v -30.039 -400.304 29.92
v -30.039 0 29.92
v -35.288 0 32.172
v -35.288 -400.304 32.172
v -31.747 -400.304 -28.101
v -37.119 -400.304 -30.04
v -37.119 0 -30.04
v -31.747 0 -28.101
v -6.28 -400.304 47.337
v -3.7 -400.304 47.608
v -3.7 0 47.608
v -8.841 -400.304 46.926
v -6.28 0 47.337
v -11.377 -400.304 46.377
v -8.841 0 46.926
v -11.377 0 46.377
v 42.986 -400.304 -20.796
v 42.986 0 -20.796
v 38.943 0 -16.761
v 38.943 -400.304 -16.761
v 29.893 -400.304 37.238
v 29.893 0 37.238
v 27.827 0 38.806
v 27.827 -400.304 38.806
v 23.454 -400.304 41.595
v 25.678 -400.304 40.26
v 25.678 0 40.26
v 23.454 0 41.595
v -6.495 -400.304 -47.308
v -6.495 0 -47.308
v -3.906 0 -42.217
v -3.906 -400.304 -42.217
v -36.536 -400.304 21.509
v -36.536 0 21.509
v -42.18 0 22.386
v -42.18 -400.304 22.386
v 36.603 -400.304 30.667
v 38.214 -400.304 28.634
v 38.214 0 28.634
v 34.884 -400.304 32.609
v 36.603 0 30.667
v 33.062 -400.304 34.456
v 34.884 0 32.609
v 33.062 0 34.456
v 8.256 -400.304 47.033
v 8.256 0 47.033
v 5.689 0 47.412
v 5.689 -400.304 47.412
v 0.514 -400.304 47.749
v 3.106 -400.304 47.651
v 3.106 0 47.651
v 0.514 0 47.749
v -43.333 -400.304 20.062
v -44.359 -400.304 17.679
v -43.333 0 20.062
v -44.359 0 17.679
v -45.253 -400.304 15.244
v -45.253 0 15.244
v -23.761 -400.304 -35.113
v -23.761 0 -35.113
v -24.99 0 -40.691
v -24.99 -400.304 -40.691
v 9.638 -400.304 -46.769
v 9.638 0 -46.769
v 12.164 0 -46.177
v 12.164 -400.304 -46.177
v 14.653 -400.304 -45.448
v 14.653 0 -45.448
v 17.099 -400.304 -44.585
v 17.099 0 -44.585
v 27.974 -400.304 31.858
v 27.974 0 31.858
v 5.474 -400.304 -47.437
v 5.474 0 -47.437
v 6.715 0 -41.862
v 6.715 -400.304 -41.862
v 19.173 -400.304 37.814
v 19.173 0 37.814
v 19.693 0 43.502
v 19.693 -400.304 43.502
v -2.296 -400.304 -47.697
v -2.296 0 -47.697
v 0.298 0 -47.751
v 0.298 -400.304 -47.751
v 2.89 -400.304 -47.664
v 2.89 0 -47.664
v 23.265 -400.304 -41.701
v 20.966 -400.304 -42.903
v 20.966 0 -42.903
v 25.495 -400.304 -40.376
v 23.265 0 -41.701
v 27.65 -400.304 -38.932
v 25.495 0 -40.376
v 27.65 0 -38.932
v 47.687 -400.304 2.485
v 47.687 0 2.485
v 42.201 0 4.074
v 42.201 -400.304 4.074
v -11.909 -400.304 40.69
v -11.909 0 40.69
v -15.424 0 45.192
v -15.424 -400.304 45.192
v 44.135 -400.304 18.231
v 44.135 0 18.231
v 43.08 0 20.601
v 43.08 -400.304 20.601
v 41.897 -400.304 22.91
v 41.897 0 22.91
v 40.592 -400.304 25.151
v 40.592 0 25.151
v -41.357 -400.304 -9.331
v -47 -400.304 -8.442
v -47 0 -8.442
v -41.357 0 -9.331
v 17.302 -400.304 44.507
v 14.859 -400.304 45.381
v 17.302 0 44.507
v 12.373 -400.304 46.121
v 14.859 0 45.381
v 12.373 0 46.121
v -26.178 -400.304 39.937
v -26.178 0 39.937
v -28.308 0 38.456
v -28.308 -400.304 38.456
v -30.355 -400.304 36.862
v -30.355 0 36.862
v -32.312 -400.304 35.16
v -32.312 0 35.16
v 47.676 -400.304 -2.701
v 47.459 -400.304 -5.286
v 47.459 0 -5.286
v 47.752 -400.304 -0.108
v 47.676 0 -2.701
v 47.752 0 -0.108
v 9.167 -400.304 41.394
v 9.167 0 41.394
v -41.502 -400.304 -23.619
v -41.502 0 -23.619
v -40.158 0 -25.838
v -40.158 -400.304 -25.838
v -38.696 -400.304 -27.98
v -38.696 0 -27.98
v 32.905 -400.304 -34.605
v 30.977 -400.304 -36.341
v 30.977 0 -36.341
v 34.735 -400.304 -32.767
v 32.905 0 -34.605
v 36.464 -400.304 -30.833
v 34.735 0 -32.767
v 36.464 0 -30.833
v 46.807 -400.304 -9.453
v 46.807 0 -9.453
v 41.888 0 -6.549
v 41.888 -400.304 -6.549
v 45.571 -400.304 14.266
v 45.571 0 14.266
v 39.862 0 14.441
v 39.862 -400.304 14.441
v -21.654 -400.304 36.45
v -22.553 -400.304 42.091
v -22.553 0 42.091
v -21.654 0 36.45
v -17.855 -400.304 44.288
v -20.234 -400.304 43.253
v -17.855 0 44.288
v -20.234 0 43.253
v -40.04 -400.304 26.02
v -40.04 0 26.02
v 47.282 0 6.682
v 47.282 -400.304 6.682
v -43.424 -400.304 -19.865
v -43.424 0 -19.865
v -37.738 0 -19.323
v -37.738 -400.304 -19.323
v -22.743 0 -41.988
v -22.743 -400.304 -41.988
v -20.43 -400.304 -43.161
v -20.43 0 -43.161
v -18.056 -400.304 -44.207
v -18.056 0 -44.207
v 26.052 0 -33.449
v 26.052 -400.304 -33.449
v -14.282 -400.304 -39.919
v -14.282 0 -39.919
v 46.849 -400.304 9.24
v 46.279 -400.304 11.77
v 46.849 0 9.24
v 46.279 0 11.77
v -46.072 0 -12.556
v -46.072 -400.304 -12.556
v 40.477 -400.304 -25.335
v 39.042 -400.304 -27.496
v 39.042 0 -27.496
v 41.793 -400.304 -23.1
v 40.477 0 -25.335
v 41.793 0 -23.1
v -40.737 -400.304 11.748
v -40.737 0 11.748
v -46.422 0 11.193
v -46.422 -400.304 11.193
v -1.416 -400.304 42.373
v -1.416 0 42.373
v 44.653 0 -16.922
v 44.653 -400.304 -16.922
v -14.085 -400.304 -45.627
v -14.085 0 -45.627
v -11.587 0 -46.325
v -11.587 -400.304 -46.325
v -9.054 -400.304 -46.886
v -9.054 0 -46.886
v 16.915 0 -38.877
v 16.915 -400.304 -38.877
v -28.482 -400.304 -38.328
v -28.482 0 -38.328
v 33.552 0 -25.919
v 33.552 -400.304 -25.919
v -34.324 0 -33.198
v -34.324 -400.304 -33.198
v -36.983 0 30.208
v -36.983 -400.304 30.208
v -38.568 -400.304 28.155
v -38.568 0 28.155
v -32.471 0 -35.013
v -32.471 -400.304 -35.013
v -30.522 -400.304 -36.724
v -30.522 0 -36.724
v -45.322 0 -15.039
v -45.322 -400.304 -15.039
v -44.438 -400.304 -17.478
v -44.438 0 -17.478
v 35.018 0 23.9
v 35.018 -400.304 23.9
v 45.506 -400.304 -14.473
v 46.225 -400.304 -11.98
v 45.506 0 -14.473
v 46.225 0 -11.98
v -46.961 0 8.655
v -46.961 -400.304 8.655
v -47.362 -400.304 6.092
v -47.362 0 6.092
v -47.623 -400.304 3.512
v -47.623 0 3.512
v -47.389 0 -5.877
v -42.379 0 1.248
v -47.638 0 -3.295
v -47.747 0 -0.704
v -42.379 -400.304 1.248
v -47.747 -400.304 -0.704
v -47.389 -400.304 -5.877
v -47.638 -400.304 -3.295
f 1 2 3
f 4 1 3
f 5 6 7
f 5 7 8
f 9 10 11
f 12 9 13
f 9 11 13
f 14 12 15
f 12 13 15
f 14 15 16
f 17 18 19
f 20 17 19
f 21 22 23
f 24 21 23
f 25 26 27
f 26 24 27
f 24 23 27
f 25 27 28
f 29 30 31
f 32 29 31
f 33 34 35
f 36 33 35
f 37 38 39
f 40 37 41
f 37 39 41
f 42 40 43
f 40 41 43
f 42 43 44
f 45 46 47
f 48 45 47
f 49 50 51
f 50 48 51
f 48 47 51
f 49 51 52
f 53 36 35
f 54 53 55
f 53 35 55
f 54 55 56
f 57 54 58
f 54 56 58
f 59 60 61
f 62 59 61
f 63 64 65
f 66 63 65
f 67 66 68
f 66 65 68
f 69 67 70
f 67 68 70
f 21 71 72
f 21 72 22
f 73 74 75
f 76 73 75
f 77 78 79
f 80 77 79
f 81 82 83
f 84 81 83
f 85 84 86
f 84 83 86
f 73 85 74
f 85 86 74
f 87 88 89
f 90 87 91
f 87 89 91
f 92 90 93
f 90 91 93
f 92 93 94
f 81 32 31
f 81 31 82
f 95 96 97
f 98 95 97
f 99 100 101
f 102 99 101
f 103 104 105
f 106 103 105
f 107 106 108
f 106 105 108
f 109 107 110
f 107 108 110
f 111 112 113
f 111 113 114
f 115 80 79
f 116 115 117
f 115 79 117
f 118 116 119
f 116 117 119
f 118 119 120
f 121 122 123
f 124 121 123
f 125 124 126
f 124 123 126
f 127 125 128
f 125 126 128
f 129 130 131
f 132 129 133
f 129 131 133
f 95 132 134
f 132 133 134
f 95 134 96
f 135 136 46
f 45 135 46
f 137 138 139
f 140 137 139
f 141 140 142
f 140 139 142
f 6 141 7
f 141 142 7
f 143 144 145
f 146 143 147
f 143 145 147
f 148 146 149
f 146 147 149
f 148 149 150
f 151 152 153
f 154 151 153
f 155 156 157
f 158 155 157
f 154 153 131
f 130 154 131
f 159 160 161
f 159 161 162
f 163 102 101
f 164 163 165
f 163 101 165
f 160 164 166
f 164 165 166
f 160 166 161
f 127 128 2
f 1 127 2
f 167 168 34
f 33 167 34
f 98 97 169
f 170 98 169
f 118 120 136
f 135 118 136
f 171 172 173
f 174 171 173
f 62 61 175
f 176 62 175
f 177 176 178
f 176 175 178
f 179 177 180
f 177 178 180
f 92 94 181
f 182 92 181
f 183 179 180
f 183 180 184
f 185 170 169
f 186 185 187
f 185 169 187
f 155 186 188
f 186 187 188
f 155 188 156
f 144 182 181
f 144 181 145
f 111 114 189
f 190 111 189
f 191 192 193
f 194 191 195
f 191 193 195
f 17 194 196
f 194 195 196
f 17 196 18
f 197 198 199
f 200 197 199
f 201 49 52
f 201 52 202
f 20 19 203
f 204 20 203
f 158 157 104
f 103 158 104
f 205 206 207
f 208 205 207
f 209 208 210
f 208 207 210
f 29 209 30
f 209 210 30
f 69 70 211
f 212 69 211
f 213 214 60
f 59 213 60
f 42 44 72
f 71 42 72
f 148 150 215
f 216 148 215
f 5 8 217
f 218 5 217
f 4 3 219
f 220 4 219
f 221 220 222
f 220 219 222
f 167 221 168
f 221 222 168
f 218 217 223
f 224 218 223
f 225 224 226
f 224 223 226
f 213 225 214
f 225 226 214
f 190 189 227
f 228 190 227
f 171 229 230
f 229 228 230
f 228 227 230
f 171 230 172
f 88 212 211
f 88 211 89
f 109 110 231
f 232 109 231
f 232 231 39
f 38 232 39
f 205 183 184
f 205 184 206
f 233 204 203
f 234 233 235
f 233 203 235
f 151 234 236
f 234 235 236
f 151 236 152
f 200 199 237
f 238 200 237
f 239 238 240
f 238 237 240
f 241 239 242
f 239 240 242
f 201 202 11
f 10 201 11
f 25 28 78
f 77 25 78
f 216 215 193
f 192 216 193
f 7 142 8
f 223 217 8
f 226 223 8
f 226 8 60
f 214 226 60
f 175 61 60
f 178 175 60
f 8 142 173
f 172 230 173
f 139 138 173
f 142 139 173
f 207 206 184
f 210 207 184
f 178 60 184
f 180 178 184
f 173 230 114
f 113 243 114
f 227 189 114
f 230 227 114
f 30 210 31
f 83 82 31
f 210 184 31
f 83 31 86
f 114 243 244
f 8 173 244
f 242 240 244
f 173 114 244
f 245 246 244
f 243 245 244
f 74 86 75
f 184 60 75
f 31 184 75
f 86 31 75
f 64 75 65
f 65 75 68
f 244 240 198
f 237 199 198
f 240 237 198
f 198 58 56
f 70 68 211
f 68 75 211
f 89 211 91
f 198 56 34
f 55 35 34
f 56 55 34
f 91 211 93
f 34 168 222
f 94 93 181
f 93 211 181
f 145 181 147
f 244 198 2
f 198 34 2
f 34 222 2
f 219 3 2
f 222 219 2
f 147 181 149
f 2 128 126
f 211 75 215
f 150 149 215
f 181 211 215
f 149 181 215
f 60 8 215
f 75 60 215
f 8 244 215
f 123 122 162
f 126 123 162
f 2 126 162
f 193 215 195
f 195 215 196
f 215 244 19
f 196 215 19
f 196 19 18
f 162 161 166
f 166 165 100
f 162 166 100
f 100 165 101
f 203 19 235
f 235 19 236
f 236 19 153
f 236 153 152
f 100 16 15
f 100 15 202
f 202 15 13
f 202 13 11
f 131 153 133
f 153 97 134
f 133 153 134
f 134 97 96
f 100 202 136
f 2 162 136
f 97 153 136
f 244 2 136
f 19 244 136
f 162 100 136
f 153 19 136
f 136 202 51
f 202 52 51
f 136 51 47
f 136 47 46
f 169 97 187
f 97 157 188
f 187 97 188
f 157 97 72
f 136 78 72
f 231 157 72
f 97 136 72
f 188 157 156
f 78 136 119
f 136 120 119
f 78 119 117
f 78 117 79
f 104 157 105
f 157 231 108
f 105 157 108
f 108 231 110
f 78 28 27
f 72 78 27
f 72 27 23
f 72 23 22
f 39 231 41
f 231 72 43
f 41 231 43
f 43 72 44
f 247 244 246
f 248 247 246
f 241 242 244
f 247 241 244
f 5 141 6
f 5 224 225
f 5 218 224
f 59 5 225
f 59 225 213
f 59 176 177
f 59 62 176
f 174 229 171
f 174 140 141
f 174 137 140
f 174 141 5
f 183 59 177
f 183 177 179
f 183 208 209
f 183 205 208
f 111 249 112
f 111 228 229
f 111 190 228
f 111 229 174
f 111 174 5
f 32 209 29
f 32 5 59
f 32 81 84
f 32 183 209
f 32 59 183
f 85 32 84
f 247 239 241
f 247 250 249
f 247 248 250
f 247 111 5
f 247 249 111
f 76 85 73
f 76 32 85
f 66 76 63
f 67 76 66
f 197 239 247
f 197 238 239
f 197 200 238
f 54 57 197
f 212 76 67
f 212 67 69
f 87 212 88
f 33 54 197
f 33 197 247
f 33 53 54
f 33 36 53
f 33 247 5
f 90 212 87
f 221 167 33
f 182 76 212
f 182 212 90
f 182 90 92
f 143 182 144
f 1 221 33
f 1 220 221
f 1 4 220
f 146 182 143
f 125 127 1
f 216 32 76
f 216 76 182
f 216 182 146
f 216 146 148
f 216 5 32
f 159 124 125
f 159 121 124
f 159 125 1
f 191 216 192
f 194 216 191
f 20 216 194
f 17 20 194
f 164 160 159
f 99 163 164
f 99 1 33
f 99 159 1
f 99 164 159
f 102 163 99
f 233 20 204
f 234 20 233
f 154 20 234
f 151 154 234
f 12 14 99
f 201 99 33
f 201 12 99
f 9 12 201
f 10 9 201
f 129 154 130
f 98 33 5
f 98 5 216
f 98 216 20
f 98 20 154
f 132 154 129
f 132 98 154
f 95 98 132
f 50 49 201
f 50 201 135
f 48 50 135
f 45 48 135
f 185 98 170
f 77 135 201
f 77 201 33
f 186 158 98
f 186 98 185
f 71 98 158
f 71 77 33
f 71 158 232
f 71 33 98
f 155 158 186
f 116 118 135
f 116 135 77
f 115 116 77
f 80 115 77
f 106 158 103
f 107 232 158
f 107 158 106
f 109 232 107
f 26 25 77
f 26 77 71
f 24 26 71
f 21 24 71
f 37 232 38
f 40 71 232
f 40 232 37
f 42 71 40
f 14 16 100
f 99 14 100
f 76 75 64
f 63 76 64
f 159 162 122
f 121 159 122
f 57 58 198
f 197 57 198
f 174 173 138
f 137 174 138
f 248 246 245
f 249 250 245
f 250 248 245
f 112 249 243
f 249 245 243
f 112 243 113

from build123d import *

# Parameters (mm, degrees)
F0_R            = 47.752
F1_DEPTH        = 400.304
F3_DEPTH        = 400.305
F3_COPIES_COUNT = 25


# Not quite as in the source:
# - a pattern or mirror of a feature is missing from the dataset's text; its kind, count and spacing are read off the source's solid


with BuildPart() as f1:
    # F0 (on Front) → F1 (new body)
    with BuildSketch(Plane.XZ):
        Circle(F0_R)
    extrude(amount=F1_DEPTH)

    # F2 (on face) → F3 (cut, through all)
    with BuildSketch(Plane(origin=(0, 0, 0), x_dir=(-1, 0, 0), z_dir=(0, 1, 0))):
        Polygon((-9.1665348659, 41.3941448169), (-6.7116842624, 56.5903173732), (-17.8075077925, 54.133200462), align=None)
    f3 = extrude(amount=-F3_DEPTH, mode=Mode.SUBTRACT)

    # F3_copies: F3 ×25 about axis
    f3_copies_axis = Axis((0, 0, 0), (0, 1, 0))
    for i in range(1, F3_COPIES_COUNT):
        add(f3.rotate(f3_copies_axis, i * 360 / F3_COPIES_COUNT), mode=Mode.SUBTRACT)


solid = f1.part
